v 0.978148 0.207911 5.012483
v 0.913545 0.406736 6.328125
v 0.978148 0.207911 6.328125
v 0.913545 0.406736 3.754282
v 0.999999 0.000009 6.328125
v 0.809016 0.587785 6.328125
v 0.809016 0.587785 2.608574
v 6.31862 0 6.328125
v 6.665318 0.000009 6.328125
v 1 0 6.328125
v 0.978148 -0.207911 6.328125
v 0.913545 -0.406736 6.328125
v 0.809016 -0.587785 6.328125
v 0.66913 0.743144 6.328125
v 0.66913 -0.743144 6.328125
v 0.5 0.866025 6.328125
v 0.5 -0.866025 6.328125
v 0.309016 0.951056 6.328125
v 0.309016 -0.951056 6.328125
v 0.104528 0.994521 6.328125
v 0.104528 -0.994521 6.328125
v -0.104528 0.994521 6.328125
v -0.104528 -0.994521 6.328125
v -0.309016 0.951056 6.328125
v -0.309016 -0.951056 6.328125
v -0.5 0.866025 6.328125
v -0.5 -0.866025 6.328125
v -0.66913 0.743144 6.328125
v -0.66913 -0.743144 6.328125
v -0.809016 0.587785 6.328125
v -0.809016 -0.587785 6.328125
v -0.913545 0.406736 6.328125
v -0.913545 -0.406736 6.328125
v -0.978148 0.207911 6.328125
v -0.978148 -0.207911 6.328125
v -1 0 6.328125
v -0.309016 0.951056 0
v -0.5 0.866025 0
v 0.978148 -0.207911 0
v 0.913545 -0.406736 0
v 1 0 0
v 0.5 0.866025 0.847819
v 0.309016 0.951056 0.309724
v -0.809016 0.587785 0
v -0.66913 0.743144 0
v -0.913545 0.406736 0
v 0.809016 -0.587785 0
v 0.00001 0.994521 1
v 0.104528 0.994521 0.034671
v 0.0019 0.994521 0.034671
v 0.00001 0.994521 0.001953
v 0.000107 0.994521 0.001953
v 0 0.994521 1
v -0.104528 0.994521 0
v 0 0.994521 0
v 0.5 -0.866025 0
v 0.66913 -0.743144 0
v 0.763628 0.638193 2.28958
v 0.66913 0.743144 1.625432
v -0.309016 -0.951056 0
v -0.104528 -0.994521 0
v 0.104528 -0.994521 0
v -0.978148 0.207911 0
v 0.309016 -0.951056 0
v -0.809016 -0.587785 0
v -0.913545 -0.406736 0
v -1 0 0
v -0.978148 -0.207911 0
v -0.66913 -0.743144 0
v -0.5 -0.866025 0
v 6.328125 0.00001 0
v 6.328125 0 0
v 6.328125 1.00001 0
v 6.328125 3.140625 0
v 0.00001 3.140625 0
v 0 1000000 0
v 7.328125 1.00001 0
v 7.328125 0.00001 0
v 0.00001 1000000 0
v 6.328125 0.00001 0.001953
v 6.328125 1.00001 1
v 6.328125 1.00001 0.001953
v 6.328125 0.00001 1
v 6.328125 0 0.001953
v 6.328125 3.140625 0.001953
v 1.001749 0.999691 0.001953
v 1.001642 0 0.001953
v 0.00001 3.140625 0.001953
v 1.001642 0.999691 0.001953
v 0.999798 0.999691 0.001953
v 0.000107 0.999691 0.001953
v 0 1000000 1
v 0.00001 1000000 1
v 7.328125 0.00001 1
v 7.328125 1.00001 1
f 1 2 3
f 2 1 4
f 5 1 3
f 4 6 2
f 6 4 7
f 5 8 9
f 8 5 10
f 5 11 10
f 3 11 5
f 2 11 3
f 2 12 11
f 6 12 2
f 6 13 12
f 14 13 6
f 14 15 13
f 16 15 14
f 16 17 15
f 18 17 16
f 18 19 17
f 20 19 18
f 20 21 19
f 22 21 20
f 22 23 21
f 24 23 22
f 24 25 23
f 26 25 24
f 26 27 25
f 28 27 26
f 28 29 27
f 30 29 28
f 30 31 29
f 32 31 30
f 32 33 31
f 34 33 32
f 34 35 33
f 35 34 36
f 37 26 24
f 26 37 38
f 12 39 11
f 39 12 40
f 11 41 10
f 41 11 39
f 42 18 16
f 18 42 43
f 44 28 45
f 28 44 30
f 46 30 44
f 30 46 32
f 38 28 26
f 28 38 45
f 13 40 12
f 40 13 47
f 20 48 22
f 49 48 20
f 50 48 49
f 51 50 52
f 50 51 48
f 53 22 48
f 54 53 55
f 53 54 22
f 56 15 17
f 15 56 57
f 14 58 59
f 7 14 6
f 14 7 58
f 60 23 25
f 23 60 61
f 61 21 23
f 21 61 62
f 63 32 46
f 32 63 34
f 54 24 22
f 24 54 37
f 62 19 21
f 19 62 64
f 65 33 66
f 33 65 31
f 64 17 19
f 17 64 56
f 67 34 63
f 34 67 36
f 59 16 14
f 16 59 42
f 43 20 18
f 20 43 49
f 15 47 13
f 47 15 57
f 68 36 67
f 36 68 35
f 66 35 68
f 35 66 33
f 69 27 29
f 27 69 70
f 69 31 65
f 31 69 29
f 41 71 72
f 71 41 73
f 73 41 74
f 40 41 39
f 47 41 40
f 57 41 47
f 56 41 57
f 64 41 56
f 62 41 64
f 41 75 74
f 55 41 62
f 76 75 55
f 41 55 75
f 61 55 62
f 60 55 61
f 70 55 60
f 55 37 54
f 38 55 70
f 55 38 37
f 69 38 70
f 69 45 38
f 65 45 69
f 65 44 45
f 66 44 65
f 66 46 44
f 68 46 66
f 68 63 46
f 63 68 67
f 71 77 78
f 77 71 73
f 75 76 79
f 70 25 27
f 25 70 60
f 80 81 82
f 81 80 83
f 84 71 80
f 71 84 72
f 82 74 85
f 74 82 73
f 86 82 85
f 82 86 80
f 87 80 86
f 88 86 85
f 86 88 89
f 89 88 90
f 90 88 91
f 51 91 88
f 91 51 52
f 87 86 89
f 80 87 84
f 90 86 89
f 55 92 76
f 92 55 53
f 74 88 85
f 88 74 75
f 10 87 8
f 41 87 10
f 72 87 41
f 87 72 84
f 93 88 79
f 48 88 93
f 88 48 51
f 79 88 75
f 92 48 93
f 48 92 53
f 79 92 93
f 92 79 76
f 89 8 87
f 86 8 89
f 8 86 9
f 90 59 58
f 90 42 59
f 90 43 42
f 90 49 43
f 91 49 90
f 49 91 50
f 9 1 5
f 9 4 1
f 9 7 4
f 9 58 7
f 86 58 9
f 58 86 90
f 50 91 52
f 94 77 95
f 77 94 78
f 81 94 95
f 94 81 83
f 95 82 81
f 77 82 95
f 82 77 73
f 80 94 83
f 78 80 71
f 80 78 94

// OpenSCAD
cylinder(h = 20 * pow(0.75, 4), r = 1);
cube([6.328125, 3.140625, 1/512]);
cube([1e-5, 1e6, 1]);
circle(r = 1234565);
circle(r = -0);
sphere(r=0.5^20);
color([0.1015625, 0.5, 1e-5]) square([6.328125, 1e7]);
offset(delta=-0) square(1);
linear_extrude(height=6.328125, twist=3.140625, scale=[6.328125, 1e-5]) square(1);
text("a", size=6.328125, spacing=1e-5);
translate([6.328125, 1e-5, 0]) cube();
$fs = 0.001; linear_extrude(1) circle(1); rotate_extrude() circle(1); offset(r=1) circle(1); text("a");
